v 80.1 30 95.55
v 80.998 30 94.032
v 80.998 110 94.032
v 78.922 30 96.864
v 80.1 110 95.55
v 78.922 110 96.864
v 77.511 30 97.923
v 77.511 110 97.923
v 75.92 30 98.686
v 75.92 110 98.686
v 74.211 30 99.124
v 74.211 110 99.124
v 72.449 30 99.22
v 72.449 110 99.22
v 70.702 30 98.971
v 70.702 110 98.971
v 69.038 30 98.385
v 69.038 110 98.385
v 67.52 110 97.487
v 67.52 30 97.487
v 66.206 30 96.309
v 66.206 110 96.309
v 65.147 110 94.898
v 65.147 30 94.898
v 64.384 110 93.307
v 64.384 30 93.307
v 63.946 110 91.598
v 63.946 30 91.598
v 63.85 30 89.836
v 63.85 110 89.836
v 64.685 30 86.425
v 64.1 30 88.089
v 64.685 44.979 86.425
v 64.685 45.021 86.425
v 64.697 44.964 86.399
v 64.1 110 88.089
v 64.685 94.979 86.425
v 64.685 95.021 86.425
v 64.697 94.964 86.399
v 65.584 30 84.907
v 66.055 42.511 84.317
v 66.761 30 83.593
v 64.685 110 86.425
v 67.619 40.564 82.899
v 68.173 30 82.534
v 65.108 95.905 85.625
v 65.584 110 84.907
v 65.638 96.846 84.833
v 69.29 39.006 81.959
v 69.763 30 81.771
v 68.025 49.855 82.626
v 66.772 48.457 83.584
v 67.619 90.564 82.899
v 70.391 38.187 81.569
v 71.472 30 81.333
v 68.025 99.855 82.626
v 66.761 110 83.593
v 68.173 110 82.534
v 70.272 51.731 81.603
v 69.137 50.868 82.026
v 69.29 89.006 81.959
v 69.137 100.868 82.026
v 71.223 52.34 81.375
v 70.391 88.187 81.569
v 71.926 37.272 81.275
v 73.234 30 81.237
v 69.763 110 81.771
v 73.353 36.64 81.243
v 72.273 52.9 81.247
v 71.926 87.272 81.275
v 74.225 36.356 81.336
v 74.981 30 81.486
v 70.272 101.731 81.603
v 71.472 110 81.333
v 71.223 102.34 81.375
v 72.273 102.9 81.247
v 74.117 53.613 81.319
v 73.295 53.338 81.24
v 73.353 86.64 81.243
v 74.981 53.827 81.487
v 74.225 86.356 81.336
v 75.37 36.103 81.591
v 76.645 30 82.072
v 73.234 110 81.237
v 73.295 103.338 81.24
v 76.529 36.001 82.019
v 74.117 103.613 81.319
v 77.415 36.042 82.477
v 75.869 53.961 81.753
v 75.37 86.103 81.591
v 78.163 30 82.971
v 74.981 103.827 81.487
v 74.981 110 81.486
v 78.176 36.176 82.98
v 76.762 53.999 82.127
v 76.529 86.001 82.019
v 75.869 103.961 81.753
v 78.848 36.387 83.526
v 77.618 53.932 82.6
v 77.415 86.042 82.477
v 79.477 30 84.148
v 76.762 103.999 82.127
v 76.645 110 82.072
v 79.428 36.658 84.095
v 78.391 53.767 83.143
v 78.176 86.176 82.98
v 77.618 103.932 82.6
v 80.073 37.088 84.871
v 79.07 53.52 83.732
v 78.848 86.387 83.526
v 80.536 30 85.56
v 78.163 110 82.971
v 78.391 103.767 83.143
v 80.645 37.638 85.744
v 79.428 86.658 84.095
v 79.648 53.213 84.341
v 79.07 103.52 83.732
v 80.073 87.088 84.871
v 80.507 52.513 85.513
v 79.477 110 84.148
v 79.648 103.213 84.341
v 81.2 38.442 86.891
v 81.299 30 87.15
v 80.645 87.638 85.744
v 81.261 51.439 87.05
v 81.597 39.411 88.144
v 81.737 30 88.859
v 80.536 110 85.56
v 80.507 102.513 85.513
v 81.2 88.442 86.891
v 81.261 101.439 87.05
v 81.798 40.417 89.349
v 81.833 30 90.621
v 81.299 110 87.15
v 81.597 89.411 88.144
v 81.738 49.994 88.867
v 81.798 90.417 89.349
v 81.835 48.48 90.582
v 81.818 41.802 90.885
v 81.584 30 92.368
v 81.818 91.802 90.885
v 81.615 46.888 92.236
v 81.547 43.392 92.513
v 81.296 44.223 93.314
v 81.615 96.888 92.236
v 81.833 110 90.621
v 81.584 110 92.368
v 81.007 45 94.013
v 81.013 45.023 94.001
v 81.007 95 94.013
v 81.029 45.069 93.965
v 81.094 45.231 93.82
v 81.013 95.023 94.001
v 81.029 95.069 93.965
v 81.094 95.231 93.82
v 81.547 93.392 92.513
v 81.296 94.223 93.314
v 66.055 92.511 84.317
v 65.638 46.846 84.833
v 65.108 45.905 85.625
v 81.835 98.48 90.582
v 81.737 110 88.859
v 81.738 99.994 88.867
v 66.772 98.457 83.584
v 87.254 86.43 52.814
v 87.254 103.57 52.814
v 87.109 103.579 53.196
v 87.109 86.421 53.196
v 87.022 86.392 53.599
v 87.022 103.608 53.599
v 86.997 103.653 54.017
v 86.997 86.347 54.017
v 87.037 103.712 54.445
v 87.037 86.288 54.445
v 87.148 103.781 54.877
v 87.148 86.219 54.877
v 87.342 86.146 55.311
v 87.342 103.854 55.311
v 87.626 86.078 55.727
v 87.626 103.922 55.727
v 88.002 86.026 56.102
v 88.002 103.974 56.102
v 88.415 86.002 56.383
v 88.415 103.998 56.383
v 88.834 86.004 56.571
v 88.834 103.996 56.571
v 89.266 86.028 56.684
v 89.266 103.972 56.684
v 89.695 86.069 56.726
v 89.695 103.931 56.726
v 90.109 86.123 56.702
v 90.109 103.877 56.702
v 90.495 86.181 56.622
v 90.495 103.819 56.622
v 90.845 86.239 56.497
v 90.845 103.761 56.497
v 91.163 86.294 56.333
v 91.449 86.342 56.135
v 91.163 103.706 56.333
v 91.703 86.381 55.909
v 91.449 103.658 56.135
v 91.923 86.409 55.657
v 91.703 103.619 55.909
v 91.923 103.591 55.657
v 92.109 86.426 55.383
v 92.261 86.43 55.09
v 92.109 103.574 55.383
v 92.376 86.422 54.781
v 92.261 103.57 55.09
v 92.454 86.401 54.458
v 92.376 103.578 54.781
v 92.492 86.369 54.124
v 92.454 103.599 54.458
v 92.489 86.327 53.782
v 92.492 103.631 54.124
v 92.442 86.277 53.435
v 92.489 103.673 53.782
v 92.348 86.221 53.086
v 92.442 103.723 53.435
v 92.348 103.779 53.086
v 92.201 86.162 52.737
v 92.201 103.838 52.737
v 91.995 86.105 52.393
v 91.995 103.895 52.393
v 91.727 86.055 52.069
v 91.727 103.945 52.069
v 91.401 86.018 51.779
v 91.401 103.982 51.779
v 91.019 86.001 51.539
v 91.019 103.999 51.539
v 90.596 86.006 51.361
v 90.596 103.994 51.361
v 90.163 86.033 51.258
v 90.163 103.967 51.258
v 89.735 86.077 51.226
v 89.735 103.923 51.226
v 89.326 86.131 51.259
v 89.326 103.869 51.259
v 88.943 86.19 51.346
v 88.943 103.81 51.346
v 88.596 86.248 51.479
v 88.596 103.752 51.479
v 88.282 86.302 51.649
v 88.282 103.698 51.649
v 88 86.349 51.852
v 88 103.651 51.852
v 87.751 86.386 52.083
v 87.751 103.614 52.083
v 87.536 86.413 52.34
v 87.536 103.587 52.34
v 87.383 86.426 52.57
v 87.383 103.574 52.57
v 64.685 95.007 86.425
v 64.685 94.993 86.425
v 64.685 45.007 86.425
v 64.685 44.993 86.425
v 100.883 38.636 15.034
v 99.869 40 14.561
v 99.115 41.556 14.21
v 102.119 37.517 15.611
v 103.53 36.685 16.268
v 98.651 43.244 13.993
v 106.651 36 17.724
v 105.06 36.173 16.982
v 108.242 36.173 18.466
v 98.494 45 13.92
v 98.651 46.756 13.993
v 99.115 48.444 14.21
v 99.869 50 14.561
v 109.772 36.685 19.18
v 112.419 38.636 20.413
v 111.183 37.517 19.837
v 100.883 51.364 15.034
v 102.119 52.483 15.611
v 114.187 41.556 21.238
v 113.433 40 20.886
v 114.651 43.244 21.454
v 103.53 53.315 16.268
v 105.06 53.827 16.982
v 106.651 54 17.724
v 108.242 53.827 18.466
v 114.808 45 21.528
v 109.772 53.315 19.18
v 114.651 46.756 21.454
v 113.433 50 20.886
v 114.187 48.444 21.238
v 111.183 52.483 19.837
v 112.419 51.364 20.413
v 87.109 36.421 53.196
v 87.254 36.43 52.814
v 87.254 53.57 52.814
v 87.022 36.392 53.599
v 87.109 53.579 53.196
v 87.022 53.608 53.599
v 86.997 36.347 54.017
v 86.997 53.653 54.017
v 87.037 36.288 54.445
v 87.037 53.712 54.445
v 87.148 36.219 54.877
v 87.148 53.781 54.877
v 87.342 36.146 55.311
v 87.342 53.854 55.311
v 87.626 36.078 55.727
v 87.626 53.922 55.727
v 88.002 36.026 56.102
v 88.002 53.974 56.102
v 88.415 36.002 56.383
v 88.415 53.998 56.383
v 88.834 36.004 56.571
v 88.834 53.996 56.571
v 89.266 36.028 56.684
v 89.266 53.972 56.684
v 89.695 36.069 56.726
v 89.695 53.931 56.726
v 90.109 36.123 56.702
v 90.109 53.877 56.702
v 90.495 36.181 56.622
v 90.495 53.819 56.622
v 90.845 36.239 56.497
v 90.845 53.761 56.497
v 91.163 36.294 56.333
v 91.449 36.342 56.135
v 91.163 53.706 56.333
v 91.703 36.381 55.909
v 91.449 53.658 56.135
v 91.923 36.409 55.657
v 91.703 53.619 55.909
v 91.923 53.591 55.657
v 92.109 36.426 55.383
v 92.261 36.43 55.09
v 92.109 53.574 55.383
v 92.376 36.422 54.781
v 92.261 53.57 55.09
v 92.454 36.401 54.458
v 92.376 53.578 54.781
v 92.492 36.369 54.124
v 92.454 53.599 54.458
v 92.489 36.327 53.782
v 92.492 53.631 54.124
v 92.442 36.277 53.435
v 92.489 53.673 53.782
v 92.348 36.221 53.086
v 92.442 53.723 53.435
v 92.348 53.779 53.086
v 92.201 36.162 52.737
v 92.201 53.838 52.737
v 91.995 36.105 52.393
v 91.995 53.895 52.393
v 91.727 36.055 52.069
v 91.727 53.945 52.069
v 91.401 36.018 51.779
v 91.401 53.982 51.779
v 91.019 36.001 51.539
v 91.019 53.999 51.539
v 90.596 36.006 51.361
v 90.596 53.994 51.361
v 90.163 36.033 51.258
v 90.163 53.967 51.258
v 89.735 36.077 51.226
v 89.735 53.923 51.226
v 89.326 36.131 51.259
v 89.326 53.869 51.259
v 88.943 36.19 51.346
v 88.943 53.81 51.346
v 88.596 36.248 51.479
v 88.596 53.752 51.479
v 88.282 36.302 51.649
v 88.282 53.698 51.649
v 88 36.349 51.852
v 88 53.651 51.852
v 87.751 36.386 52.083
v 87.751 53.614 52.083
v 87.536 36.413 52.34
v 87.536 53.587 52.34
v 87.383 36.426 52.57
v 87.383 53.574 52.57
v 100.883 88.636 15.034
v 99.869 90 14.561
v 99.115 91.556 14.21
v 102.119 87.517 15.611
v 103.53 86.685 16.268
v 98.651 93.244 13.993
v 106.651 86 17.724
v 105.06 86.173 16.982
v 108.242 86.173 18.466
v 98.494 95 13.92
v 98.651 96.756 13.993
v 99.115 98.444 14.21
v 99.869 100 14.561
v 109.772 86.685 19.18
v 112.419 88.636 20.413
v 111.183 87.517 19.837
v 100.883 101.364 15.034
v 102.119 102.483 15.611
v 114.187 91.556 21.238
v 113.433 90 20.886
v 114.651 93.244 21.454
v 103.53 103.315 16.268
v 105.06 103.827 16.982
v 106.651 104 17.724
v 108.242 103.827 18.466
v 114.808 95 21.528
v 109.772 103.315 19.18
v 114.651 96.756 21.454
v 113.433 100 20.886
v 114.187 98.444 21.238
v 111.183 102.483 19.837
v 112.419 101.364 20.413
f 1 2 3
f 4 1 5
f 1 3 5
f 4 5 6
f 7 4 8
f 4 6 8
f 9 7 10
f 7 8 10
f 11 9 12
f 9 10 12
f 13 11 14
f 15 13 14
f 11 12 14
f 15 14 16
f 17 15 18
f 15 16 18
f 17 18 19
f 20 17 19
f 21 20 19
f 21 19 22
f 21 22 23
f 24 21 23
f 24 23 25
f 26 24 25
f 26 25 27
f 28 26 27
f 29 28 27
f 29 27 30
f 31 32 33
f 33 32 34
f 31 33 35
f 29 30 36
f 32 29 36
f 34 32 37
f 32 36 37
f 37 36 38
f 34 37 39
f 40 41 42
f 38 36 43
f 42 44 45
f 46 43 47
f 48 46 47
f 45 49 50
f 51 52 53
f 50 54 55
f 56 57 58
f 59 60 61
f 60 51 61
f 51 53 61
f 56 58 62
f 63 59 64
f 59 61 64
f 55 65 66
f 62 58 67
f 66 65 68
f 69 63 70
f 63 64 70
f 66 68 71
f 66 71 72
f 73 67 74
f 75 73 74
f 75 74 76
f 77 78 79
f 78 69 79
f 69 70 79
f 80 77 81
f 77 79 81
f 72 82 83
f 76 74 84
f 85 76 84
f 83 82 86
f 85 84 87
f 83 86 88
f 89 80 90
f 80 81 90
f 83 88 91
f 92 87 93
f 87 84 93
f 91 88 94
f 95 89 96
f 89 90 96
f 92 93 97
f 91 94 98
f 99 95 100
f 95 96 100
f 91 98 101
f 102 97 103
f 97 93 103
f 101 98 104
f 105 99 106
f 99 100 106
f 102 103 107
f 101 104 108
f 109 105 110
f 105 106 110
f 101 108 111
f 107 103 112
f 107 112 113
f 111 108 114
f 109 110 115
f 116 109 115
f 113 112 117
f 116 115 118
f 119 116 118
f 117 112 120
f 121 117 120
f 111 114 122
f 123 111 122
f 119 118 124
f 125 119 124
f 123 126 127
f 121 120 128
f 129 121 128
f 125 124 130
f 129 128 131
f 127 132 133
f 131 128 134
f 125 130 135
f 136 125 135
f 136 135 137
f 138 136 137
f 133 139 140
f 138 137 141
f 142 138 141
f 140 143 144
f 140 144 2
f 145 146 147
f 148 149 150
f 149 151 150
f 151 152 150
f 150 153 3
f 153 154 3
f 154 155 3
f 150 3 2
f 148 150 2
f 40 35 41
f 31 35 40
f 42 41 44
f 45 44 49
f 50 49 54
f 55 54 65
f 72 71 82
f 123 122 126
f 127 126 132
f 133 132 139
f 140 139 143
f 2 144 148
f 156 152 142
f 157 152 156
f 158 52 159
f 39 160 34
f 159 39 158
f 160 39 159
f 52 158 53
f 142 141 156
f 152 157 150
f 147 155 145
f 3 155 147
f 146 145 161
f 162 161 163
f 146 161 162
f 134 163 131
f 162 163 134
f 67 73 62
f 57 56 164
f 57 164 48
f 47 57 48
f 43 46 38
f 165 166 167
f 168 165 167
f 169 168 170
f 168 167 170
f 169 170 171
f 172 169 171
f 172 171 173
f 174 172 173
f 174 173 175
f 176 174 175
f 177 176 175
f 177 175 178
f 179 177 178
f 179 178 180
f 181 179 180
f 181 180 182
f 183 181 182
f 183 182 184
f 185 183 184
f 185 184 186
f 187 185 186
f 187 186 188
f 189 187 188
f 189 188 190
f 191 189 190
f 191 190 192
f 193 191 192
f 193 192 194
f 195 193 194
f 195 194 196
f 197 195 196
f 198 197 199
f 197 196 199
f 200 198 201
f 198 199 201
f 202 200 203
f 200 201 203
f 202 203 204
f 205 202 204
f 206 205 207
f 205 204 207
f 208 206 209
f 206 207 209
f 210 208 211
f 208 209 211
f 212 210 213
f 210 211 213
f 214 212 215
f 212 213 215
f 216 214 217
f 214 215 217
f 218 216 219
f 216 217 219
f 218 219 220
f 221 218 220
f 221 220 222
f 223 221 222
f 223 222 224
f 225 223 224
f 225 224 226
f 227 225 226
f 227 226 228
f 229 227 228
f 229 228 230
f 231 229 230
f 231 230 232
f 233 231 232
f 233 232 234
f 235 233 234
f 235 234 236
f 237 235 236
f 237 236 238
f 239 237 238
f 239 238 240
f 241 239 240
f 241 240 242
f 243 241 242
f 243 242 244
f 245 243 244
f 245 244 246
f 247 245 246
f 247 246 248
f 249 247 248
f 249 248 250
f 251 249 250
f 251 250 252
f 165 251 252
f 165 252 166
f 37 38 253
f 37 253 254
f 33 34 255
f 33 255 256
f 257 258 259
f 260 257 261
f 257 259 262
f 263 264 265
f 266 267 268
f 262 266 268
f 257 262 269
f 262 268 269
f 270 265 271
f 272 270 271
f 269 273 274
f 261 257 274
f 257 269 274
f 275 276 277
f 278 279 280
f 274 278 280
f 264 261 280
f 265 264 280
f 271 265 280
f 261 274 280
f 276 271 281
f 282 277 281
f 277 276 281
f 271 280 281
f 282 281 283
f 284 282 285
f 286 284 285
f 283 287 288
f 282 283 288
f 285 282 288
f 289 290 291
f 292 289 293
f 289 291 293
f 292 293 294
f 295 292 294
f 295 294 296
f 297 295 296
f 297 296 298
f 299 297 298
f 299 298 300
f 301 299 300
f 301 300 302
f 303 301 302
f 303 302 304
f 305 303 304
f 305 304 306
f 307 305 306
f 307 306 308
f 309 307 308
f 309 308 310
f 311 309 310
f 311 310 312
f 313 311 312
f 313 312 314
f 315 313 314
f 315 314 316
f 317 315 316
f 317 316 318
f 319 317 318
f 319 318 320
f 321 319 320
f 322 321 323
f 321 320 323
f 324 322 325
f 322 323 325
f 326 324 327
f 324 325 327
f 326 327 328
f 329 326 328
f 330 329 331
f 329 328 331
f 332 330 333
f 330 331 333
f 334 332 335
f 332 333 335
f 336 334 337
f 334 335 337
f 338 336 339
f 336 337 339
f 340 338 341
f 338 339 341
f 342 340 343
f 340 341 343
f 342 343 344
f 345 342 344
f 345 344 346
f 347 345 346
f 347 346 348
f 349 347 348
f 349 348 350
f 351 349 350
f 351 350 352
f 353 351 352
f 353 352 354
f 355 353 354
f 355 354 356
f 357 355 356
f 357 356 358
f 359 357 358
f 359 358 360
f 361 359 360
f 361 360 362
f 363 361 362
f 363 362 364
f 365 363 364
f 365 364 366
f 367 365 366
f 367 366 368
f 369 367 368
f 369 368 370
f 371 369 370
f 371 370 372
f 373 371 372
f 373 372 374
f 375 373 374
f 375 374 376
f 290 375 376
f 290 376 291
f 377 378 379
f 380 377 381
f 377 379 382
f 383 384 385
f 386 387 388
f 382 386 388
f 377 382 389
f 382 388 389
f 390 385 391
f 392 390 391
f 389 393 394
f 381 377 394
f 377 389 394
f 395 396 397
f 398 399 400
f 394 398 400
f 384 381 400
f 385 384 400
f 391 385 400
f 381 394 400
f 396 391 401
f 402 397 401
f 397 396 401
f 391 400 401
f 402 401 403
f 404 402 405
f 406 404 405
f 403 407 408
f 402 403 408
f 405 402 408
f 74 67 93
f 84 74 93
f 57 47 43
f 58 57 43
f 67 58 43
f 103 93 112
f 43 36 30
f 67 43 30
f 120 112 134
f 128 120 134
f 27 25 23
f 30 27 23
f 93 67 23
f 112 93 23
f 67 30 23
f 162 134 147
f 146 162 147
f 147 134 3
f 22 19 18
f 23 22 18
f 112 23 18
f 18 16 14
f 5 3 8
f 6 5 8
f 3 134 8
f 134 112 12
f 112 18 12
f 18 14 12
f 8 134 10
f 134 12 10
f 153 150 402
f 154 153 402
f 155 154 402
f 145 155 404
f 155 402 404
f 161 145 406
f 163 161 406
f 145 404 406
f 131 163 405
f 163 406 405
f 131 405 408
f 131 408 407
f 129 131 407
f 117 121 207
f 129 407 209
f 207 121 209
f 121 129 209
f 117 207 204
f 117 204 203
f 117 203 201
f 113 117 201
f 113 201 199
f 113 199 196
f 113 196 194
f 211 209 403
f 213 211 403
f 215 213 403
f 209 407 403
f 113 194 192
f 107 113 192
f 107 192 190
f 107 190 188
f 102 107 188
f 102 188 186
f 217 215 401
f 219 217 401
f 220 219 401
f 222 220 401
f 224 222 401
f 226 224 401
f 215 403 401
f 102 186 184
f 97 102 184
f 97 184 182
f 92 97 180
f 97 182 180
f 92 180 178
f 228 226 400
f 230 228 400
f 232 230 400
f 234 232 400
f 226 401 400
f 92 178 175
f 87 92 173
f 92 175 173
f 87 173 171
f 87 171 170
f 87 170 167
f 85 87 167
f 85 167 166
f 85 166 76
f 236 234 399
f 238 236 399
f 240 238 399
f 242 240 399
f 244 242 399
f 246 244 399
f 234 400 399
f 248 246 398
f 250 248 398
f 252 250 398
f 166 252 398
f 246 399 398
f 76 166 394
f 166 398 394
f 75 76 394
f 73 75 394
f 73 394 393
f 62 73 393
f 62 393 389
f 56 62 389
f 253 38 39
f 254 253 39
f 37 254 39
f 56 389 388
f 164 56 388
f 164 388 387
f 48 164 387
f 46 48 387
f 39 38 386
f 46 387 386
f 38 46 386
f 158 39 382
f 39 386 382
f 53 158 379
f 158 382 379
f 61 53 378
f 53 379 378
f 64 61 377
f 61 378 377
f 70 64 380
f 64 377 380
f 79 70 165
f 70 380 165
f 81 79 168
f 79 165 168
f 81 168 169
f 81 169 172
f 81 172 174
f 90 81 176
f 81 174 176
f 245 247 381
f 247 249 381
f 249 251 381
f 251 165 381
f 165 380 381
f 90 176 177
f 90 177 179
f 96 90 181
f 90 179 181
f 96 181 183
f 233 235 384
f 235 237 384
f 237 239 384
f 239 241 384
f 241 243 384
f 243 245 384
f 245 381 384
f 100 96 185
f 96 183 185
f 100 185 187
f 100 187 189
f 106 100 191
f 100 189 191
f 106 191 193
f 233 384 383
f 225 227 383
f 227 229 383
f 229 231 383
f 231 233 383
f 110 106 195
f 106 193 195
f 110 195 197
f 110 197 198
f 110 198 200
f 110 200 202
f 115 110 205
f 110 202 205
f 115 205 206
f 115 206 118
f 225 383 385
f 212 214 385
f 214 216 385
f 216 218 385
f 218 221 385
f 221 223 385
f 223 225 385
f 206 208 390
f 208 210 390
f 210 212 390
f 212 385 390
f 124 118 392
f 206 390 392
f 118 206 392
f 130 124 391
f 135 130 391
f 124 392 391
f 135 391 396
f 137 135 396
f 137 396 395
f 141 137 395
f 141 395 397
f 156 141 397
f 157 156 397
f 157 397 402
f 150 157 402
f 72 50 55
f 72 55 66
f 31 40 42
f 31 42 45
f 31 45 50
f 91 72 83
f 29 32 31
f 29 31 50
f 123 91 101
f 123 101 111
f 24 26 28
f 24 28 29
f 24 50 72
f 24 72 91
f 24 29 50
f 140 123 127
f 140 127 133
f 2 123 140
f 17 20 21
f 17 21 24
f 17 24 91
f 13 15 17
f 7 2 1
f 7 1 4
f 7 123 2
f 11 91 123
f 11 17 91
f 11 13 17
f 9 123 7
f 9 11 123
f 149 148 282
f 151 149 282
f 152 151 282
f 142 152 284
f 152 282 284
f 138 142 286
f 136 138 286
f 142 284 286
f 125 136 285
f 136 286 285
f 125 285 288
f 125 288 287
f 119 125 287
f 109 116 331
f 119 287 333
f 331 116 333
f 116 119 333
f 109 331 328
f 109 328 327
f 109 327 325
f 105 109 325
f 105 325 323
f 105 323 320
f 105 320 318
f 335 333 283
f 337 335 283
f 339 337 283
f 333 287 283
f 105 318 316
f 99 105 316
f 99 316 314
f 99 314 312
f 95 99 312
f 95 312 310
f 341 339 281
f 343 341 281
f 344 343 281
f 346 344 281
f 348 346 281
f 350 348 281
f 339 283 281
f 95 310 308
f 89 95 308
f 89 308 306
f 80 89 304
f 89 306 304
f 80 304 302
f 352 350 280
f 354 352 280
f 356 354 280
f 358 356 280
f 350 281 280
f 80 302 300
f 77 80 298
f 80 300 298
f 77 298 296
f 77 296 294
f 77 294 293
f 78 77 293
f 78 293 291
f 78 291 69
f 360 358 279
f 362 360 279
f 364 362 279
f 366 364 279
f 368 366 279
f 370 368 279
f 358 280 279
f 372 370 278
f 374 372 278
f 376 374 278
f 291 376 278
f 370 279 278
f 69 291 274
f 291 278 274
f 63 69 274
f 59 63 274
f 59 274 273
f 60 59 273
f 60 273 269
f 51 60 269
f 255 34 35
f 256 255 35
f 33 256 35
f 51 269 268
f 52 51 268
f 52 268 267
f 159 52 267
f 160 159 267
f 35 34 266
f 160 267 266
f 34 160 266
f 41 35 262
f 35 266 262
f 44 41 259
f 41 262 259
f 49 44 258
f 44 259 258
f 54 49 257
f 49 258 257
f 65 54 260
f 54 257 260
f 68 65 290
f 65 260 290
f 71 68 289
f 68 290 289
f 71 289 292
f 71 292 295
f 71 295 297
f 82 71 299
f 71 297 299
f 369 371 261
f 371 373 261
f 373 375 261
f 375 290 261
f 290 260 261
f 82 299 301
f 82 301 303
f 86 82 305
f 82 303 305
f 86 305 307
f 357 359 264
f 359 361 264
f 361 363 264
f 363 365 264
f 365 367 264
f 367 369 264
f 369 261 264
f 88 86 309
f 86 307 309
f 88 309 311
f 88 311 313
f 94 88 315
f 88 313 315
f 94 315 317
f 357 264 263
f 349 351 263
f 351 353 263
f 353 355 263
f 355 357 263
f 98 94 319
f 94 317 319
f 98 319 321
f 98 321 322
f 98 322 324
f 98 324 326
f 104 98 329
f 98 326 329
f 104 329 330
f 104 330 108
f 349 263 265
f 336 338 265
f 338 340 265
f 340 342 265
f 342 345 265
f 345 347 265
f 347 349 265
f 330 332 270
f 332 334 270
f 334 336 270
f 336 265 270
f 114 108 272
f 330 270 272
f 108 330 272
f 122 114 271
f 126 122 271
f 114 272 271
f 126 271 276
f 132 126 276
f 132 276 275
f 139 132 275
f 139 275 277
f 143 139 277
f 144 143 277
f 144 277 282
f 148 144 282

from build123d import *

# Parameters (mm, degrees)
SKETCH005_AS_DRAWN_R                                = 2.75
EXTRUDE_SKETCH005001_DEPTH                          = 90
EXTRUDE_SKETCH005001_ONTO_SKETCH005_ROLL_ANGLE      = 90
EXTRUDE_SKETCH005001_ONTO_SKETCH005_PLACEMENT_ANGLE = 180
CYLINDER_R                                          = 9
CYLINDER_DEPTH                                      = 80
CYLINDER001_R                                       = 9
CYLINDER001_DEPTH                                   = 80
CYLINDER001_ROLL_ANGLE                              = 90
CLONE005_PLACEMENT_ANGLE                            = 25


with BuildPart() as clone_of_sketch005_extrude001:
    # Sketch005 as drawn → Extrude_Sketch005001 (new)
    with BuildSketch(Plane.XY):
        with Locations((-90, 54)):
            Circle(SKETCH005_AS_DRAWN_R)
    extrude(amount=-EXTRUDE_SKETCH005001_DEPTH)


with BuildPart() as clone_of_sketch005_extrude001_1:
    # Extrude_Sketch005001 onto Sketch005 roll: moved
    add(clone_of_sketch005_extrude001.part.rotate(Axis((0, 0, 0), (1, 0, 0)), EXTRUDE_SKETCH005001_ONTO_SKETCH005_ROLL_ANGLE))


with BuildPart() as clone_of_sketch005_extrude001_2:
    # Extrude_Sketch005001 onto Sketch005 placement: moved
    add(clone_of_sketch005_extrude001_1.part.moved(Location((0, 111, 0))).rotate(Axis((0, 111, 0), (0, 0, 1)), EXTRUDE_SKETCH005001_ONTO_SKETCH005_PLACEMENT_ANGLE))


with BuildPart() as cilindro:
    # Cylinder → Cylinder (new body)
    with BuildSketch(Plane(origin=(76.968275, 45, 32), x_dir=(1, 0, 0), z_dir=(0, 0, 1))):
        Circle(CYLINDER_R)
    extrude(amount=CYLINDER_DEPTH)


with BuildPart() as clone_of_cilindro:
    # Clone003 base: copy of Cilindro
    add(cilindro.part)


with BuildPart() as clone_of_cilindro_1:
    # Clone003 placement: moved
    add(clone_of_cilindro.part.moved(Location((0, 50, 0))))


with BuildPart() as clone_of_cut003:
    # Cylinder001 → Cylinder001 (new body)
    with BuildSketch(Plane.XY):
        Circle(CYLINDER001_R)
    extrude(amount=CYLINDER001_DEPTH)


with BuildPart() as clone_of_cut003_1:
    # Cylinder001 roll: moved
    add(clone_of_cut003.part.rotate(Axis((0, 0, 0), (1, 0, 0)), CYLINDER001_ROLL_ANGLE))


with BuildPart() as clone_of_cut003_2:
    # Cylinder001 placement: moved
    add(clone_of_cut003_1.part.moved(Location((76.9683, 110, 112))))

    # Fusion: union Clone of Cilindro, Cilindro
    add(clone_of_cilindro_1.part)
    add(cilindro.part)


with BuildPart() as clone_of_cut003_3:
    # Fusion placement: moved
    add(clone_of_cut003_2.part.moved(Location((13.0317, 0, -18))))

    # Cut003: cut Clone of Sketch005_Extrude001
    add(clone_of_sketch005_extrude001_2.part, mode=Mode.SUBTRACT)


with BuildPart() as clone_of_cut003_4:
    # Clone005 placement: moved
    add(clone_of_cut003_3.part.moved(Location((31, 0, -33))).rotate(Axis((31, 0, -33), (0, -1, 0)), CLONE005_PLACEMENT_ANGLE))


solid = clone_of_cut003_4.part
